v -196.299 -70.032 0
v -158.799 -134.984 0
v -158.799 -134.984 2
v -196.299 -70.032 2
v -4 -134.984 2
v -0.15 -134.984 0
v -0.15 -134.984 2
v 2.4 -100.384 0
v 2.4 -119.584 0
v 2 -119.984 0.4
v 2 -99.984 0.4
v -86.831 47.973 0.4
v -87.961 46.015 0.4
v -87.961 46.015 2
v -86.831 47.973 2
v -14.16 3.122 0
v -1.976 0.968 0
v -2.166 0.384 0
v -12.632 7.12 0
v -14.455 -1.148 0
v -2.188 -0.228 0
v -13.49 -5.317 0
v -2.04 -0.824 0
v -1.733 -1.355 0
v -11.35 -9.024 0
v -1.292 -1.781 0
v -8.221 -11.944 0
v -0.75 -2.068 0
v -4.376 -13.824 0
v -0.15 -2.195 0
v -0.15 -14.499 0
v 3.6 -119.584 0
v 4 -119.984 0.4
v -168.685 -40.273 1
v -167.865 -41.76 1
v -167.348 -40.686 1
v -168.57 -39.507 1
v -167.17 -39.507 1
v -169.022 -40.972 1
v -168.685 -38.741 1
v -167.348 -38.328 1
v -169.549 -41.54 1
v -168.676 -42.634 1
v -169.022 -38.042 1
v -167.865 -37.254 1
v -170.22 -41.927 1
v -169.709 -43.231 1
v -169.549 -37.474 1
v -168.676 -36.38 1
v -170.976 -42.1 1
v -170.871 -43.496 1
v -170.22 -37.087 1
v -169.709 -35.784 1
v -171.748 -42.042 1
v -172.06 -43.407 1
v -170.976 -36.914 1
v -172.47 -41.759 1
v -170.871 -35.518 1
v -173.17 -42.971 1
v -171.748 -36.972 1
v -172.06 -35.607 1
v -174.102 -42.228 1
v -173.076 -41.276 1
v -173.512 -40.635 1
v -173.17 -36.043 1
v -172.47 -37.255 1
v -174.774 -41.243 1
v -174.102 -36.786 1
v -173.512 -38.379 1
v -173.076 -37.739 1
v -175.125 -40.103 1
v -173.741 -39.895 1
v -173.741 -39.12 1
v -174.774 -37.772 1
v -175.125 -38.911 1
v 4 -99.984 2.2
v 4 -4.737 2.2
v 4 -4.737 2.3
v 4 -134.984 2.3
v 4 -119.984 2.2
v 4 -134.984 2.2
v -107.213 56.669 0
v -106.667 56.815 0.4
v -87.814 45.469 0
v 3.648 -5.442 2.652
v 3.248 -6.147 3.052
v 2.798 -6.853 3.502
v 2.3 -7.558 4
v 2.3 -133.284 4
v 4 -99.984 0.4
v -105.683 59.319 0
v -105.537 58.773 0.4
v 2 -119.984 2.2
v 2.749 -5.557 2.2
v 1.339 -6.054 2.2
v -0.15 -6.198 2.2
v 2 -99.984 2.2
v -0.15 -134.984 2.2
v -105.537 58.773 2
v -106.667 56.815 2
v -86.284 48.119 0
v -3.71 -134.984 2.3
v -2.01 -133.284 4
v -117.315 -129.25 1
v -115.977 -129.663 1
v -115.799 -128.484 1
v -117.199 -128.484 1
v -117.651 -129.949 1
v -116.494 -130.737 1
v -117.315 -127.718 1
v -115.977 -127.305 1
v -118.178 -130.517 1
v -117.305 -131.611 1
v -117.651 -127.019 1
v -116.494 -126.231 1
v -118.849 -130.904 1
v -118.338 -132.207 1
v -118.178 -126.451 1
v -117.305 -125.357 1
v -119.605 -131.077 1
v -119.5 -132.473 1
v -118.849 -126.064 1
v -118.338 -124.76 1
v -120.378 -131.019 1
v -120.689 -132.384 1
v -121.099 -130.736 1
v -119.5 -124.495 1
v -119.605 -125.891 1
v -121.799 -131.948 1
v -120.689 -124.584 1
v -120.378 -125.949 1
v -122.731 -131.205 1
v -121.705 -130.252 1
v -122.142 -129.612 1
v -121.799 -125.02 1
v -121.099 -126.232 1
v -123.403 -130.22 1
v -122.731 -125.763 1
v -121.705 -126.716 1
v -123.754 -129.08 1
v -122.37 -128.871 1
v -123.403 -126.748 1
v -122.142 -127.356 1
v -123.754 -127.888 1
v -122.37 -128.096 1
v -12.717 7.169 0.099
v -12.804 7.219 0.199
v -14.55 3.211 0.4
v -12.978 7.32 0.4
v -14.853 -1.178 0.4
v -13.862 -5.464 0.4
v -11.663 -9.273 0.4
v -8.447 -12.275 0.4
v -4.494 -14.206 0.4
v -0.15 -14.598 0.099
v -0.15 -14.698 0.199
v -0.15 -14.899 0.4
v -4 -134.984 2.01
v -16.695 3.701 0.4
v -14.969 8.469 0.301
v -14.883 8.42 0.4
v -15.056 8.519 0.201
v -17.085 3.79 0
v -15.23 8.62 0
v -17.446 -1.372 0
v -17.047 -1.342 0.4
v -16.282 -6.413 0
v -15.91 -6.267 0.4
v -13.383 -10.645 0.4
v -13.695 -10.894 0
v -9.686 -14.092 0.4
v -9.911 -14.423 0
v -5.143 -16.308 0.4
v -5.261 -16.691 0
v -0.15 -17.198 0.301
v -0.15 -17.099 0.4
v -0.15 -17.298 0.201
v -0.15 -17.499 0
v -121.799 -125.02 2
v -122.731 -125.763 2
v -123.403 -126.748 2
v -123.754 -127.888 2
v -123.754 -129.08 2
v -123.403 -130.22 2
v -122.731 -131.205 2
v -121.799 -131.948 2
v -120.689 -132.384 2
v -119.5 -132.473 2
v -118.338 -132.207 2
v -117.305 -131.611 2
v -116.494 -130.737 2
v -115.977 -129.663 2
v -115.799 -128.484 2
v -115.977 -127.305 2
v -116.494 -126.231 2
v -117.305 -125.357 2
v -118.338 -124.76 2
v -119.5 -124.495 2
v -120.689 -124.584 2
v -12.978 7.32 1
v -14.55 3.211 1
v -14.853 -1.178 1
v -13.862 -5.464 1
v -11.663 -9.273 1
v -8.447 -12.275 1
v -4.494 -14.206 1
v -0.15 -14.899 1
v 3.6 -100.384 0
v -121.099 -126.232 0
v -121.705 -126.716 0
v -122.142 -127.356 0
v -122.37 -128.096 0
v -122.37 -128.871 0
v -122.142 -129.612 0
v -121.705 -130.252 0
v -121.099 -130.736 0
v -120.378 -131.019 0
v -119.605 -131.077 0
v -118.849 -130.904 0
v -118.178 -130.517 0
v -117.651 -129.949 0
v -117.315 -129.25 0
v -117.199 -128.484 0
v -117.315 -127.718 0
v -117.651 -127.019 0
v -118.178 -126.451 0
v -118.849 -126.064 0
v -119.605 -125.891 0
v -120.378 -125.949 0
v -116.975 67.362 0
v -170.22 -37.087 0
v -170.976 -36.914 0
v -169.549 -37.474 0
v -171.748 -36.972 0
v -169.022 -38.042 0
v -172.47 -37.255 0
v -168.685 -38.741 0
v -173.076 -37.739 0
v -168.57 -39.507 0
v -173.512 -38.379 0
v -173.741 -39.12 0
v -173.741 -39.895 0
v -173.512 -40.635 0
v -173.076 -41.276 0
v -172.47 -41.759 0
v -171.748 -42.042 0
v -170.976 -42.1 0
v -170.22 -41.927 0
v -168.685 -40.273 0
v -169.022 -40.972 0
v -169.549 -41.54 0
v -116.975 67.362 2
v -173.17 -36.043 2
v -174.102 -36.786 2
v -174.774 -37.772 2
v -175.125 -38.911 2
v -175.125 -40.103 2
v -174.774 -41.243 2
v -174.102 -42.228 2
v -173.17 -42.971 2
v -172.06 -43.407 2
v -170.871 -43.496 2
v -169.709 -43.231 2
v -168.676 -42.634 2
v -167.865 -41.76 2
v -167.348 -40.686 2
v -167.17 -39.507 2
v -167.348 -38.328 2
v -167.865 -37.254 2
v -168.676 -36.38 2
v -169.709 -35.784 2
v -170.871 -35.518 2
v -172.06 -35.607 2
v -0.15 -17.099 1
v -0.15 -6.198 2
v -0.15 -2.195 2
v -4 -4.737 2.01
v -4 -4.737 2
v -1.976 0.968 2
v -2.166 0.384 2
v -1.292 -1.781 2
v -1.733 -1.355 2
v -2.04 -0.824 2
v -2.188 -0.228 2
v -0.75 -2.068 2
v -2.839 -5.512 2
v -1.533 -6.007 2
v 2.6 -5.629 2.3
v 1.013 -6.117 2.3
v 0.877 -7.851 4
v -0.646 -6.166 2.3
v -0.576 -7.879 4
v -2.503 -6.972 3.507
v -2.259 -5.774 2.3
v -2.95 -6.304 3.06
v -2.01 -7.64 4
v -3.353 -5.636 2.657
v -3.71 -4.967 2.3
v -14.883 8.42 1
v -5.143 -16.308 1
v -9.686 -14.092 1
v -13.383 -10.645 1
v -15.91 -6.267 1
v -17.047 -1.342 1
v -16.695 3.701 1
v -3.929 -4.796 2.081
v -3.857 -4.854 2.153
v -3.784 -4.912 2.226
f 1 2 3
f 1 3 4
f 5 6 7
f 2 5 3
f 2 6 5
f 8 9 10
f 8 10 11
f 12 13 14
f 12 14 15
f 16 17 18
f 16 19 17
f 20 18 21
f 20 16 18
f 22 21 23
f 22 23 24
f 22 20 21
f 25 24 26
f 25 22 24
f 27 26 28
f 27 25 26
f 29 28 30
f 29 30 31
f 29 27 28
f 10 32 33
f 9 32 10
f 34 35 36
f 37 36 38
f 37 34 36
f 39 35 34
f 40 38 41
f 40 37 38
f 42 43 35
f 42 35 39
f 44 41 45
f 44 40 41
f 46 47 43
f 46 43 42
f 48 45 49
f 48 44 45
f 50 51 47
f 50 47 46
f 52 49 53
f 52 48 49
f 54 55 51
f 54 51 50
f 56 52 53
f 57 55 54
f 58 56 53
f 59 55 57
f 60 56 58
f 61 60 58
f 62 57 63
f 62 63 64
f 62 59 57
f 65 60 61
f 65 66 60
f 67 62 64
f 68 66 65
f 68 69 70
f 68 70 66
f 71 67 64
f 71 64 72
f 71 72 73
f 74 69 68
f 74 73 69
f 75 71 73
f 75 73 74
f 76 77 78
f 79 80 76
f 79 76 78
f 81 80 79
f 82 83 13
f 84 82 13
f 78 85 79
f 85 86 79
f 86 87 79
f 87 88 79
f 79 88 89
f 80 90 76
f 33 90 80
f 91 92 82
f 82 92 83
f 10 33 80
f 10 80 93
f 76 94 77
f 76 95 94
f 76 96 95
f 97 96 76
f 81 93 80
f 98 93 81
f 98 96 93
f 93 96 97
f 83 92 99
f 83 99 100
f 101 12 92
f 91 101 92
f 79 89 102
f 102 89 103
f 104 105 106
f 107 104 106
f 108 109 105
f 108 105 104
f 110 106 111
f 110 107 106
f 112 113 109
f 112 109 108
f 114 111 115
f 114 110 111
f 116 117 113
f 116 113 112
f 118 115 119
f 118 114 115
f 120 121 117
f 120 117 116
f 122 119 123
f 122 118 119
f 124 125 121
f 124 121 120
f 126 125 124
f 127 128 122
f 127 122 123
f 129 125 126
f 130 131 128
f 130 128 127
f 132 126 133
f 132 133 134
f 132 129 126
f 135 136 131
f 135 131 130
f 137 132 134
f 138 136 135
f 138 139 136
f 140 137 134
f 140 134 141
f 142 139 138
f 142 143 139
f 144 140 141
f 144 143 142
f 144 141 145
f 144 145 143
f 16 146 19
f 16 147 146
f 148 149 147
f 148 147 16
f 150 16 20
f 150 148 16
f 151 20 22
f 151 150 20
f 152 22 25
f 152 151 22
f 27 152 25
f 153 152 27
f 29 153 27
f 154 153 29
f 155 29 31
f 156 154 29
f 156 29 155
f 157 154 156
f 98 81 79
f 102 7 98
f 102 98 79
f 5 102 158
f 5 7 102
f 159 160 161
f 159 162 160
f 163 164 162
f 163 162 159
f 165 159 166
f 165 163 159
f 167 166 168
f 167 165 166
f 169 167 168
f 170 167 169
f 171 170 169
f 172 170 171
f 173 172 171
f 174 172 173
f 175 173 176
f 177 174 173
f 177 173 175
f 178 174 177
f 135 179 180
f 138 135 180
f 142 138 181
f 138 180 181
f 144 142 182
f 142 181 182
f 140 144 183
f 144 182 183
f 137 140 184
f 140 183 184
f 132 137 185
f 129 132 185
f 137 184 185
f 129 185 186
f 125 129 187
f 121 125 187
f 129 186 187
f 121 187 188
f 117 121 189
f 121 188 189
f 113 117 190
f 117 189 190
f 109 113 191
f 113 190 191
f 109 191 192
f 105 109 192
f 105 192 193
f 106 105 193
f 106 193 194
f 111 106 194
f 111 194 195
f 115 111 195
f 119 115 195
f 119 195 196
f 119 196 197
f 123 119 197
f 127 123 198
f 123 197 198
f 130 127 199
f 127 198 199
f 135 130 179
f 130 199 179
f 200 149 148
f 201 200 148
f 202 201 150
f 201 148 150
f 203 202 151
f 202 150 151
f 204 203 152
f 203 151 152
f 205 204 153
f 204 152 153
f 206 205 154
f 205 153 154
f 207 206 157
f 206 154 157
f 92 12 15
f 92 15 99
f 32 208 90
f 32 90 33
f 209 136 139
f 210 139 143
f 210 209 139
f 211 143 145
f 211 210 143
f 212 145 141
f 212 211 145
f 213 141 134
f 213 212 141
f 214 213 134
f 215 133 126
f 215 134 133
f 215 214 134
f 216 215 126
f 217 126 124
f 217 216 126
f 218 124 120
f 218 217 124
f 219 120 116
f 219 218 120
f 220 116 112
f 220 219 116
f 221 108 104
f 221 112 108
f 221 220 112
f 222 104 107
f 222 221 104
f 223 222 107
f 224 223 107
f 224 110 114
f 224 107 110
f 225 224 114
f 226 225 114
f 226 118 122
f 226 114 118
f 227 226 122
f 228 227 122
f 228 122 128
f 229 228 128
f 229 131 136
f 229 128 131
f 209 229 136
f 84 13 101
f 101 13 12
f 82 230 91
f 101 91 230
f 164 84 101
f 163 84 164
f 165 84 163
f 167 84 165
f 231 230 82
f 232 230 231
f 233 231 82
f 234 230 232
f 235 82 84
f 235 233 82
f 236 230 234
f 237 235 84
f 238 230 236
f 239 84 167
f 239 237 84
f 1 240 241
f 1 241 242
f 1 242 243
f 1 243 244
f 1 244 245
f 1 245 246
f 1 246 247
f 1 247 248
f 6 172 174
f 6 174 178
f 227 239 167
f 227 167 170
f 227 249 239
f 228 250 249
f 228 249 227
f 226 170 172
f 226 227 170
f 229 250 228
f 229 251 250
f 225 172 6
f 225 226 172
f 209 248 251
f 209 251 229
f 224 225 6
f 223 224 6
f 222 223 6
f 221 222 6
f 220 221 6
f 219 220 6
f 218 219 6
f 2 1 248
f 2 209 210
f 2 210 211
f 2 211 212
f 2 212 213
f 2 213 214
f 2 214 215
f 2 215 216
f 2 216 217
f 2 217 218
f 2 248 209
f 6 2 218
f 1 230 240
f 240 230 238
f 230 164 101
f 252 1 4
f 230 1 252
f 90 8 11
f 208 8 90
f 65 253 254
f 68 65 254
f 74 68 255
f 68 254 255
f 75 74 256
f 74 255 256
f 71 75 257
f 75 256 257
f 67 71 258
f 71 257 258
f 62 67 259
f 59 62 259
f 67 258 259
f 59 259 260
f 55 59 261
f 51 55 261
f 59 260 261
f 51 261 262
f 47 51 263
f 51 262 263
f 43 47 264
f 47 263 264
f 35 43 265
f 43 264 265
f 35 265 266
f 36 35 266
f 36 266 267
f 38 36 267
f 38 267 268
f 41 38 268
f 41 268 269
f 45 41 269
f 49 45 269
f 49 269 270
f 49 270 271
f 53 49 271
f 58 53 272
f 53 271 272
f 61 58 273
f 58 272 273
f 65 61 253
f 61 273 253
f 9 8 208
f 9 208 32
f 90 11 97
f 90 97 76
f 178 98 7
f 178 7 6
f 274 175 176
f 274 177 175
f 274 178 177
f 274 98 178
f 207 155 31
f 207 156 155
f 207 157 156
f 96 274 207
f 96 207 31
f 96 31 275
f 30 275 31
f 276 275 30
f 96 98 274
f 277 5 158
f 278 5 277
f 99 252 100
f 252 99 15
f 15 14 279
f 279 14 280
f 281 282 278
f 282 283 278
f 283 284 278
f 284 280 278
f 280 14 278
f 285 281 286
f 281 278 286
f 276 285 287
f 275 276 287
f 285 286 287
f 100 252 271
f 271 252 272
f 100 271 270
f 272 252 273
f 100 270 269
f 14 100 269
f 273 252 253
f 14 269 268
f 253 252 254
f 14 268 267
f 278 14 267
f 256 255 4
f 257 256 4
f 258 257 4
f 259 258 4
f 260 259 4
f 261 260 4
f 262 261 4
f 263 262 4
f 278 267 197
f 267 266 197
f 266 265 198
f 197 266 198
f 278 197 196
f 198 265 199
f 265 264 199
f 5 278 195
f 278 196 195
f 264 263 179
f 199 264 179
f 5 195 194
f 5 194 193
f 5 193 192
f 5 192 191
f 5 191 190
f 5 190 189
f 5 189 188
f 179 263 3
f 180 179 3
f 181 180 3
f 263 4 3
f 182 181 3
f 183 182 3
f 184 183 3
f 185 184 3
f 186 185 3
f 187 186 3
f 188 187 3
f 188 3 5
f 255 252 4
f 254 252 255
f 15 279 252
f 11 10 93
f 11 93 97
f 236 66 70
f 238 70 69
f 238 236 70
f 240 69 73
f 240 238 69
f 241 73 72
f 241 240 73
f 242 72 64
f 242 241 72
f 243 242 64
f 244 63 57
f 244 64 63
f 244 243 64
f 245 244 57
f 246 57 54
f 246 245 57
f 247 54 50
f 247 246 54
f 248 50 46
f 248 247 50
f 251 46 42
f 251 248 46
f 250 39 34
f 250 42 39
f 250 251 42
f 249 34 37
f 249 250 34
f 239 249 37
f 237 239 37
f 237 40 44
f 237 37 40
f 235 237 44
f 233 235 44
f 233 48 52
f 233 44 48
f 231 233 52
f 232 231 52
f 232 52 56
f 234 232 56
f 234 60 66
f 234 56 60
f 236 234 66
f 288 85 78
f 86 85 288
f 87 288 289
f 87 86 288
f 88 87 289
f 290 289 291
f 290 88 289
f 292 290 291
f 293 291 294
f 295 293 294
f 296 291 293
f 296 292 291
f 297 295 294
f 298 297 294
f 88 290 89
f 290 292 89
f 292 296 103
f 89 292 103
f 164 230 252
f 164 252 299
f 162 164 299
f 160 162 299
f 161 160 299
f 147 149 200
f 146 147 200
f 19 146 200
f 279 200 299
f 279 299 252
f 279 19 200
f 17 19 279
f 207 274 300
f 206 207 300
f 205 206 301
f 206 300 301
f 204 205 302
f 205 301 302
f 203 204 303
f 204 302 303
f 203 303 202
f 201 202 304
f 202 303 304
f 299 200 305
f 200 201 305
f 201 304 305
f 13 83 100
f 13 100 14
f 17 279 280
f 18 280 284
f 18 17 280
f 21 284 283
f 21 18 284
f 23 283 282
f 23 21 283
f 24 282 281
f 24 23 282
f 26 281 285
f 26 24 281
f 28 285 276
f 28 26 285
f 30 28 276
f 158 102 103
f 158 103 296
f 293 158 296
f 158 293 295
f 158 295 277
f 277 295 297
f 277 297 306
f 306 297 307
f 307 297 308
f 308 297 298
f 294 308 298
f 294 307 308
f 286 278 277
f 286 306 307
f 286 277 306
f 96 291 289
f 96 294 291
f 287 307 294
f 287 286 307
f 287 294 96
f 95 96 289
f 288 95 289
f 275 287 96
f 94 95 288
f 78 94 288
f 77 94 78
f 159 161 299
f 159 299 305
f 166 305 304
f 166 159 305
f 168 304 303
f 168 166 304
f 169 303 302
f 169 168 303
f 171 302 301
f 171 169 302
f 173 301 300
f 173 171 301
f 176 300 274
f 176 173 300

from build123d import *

# Parameters (mm, degrees)
SKETCH002_R             = 2.6
PAD001_DEPTH            = 2
PAD002_DEPTH            = 2
POCKET003_DEPTH         = 2.201
PAD003_DEPTH            = 2.2
POCKET004_DEPTH         = 4.001
SKETCH006_R             = 17.1
SKETCH006_R_2           = 14.9
POCKET002_DEPTH         = 1
CHAMFER002_SIZE         = 0.4
CHAMFER_SIZE            = 1.99
SKETCH004_R             = 2.2
POCKET_DEPTH            = 4.001
SKETCH005_R             = 6.2
POCKET001_DEPTH         = 2.001
SKETCH010_R             = 4
POCKET005_DEPTH         = 1
CHAMFER001_SIZE         = 1.7
BODY002_PLACEMENT_ANGLE = 120


with BuildPart() as part:
    # Sketch002 → Pad001 (new body)
    with BuildSketch(Plane.XY):
        Polygon((-116.824546, 67.621888), (-37.5, 205.016032), (37.5, 205.016032), (116.824546, 67.621888), (0, 0.173205), align=None)
        with Locations((-51.370835, 167.991041)):
            Circle(SKETCH002_R, mode=Mode.SUBTRACT)
        with Locations((51.370835, 167.991041)):
            Circle(SKETCH002_R, mode=Mode.SUBTRACT)
    extrude(amount=PAD001_DEPTH)

    # Sketch003 → Pad002 (join)
    with BuildSketch(Plane.XY.offset(2)):
        Polygon((-118.899546, 64.027883), (-114.899546, 70.956086), (-0.173205, 4.718802), (-0.173205, 0.1), (-4.173205, -2.209401), align=None)
    extrude(amount=PAD002_DEPTH)

    # Sketch007 → Pocket003 (cut, through all)
    with BuildSketch(Plane.XY.offset(2.2)):
        Polygon((-116.824546, 67.621888), (0, 0.173205), (-4.173205, -2.209401), (-118.899546, 64.027883), align=None)
    extrude(amount=-POCKET003_DEPTH, mode=Mode.SUBTRACT)

    # Sketch008 → Pad003 (join)
    with BuildSketch(Plane.XY):
        Polygon((-104.909165, 58.259933), (-87.588657, 48.259933), (-88.588657, 46.527883), (-105.909165, 56.527883), align=None)
    extrude(amount=PAD003_DEPTH)

    # Sketch009 → Pocket004 (cut, through all)
    with BuildSketch(Plane.XY):
        Polygon((83.830836, 53.168669), (84.960836, 51.211452), (103.666985, 62.011452), (102.536985, 63.968669), align=None)
    extrude(amount=POCKET004_DEPTH, mode=Mode.SUBTRACT)

    # Sketch006 → Pocket002 (cut)
    with BuildSketch(Plane.XY):
        Circle(SKETCH006_R)
        Circle(SKETCH006_R_2, mode=Mode.SUBTRACT)
    extrude(amount=POCKET002_DEPTH, mode=Mode.SUBTRACT)

    # Chamfer002
    chamfer002_edges = [part.edges().sort_by_distance(p)[0] for p in [
        (-96.248911, 53.259933, 0),
        (-88.088657, 47.393908, 0),
        (-97.248911, 51.527883, 0),
        (-105.409165, 57.393908, 0),
        (94.313911, 56.611452, 0),
        (103.101985, 62.99006, 0),
        (93.183911, 58.568669, 0),
        (84.395836, 52.19006, 0),
        (0, 14.9, 0),
        (0, 17.1, 0),
    ]]
    chamfer(chamfer002_edges, length=CHAMFER002_SIZE)

    # Chamfer
    chamfer_edges = [part.edges().sort_by_distance(p)[0] for p in [
        (-57.536375, 37.837444, 4),
    ]]
    chamfer(chamfer_edges, length=CHAMFER_SIZE)

    # Sketch004 → Pocket (cut, through all)
    with BuildSketch(Plane.XY):
        Circle(SKETCH004_R)
    extrude(amount=POCKET_DEPTH, mode=Mode.SUBTRACT)

    # Sketch005 → Pocket001 (cut, through all)
    with BuildSketch(Plane.XY.offset(2)):
        Circle(SKETCH005_R)
    extrude(amount=POCKET001_DEPTH, mode=Mode.SUBTRACT)

    # Sketch010 → Pocket005 (cut)
    with BuildSketch(Plane.XY.offset(2)):
        with Locations((-51.370835, 167.991041)):
            Circle(SKETCH010_R)
        with Locations((51.370835, 167.991041)):
            Circle(SKETCH010_R)
    extrude(amount=-POCKET005_DEPTH, mode=Mode.SUBTRACT)

    # Chamfer001
    chamfer001_edges = [part.edges().sort_by_distance(p)[0] for p in [
        (-5.849077, 2.056283, 4),
        (-62.500992, 31.466162, 4),
        (-117.397046, 66.630289, 4),
    ]]
    chamfer(chamfer001_edges, length=CHAMFER001_SIZE)


with BuildPart() as part_1:
    # Body002 placement: moved
    add(part.part.rotate(Axis((0, 0, 0), (0, 0, 1)), BODY002_PLACEMENT_ANGLE))


solid = part_1.part
